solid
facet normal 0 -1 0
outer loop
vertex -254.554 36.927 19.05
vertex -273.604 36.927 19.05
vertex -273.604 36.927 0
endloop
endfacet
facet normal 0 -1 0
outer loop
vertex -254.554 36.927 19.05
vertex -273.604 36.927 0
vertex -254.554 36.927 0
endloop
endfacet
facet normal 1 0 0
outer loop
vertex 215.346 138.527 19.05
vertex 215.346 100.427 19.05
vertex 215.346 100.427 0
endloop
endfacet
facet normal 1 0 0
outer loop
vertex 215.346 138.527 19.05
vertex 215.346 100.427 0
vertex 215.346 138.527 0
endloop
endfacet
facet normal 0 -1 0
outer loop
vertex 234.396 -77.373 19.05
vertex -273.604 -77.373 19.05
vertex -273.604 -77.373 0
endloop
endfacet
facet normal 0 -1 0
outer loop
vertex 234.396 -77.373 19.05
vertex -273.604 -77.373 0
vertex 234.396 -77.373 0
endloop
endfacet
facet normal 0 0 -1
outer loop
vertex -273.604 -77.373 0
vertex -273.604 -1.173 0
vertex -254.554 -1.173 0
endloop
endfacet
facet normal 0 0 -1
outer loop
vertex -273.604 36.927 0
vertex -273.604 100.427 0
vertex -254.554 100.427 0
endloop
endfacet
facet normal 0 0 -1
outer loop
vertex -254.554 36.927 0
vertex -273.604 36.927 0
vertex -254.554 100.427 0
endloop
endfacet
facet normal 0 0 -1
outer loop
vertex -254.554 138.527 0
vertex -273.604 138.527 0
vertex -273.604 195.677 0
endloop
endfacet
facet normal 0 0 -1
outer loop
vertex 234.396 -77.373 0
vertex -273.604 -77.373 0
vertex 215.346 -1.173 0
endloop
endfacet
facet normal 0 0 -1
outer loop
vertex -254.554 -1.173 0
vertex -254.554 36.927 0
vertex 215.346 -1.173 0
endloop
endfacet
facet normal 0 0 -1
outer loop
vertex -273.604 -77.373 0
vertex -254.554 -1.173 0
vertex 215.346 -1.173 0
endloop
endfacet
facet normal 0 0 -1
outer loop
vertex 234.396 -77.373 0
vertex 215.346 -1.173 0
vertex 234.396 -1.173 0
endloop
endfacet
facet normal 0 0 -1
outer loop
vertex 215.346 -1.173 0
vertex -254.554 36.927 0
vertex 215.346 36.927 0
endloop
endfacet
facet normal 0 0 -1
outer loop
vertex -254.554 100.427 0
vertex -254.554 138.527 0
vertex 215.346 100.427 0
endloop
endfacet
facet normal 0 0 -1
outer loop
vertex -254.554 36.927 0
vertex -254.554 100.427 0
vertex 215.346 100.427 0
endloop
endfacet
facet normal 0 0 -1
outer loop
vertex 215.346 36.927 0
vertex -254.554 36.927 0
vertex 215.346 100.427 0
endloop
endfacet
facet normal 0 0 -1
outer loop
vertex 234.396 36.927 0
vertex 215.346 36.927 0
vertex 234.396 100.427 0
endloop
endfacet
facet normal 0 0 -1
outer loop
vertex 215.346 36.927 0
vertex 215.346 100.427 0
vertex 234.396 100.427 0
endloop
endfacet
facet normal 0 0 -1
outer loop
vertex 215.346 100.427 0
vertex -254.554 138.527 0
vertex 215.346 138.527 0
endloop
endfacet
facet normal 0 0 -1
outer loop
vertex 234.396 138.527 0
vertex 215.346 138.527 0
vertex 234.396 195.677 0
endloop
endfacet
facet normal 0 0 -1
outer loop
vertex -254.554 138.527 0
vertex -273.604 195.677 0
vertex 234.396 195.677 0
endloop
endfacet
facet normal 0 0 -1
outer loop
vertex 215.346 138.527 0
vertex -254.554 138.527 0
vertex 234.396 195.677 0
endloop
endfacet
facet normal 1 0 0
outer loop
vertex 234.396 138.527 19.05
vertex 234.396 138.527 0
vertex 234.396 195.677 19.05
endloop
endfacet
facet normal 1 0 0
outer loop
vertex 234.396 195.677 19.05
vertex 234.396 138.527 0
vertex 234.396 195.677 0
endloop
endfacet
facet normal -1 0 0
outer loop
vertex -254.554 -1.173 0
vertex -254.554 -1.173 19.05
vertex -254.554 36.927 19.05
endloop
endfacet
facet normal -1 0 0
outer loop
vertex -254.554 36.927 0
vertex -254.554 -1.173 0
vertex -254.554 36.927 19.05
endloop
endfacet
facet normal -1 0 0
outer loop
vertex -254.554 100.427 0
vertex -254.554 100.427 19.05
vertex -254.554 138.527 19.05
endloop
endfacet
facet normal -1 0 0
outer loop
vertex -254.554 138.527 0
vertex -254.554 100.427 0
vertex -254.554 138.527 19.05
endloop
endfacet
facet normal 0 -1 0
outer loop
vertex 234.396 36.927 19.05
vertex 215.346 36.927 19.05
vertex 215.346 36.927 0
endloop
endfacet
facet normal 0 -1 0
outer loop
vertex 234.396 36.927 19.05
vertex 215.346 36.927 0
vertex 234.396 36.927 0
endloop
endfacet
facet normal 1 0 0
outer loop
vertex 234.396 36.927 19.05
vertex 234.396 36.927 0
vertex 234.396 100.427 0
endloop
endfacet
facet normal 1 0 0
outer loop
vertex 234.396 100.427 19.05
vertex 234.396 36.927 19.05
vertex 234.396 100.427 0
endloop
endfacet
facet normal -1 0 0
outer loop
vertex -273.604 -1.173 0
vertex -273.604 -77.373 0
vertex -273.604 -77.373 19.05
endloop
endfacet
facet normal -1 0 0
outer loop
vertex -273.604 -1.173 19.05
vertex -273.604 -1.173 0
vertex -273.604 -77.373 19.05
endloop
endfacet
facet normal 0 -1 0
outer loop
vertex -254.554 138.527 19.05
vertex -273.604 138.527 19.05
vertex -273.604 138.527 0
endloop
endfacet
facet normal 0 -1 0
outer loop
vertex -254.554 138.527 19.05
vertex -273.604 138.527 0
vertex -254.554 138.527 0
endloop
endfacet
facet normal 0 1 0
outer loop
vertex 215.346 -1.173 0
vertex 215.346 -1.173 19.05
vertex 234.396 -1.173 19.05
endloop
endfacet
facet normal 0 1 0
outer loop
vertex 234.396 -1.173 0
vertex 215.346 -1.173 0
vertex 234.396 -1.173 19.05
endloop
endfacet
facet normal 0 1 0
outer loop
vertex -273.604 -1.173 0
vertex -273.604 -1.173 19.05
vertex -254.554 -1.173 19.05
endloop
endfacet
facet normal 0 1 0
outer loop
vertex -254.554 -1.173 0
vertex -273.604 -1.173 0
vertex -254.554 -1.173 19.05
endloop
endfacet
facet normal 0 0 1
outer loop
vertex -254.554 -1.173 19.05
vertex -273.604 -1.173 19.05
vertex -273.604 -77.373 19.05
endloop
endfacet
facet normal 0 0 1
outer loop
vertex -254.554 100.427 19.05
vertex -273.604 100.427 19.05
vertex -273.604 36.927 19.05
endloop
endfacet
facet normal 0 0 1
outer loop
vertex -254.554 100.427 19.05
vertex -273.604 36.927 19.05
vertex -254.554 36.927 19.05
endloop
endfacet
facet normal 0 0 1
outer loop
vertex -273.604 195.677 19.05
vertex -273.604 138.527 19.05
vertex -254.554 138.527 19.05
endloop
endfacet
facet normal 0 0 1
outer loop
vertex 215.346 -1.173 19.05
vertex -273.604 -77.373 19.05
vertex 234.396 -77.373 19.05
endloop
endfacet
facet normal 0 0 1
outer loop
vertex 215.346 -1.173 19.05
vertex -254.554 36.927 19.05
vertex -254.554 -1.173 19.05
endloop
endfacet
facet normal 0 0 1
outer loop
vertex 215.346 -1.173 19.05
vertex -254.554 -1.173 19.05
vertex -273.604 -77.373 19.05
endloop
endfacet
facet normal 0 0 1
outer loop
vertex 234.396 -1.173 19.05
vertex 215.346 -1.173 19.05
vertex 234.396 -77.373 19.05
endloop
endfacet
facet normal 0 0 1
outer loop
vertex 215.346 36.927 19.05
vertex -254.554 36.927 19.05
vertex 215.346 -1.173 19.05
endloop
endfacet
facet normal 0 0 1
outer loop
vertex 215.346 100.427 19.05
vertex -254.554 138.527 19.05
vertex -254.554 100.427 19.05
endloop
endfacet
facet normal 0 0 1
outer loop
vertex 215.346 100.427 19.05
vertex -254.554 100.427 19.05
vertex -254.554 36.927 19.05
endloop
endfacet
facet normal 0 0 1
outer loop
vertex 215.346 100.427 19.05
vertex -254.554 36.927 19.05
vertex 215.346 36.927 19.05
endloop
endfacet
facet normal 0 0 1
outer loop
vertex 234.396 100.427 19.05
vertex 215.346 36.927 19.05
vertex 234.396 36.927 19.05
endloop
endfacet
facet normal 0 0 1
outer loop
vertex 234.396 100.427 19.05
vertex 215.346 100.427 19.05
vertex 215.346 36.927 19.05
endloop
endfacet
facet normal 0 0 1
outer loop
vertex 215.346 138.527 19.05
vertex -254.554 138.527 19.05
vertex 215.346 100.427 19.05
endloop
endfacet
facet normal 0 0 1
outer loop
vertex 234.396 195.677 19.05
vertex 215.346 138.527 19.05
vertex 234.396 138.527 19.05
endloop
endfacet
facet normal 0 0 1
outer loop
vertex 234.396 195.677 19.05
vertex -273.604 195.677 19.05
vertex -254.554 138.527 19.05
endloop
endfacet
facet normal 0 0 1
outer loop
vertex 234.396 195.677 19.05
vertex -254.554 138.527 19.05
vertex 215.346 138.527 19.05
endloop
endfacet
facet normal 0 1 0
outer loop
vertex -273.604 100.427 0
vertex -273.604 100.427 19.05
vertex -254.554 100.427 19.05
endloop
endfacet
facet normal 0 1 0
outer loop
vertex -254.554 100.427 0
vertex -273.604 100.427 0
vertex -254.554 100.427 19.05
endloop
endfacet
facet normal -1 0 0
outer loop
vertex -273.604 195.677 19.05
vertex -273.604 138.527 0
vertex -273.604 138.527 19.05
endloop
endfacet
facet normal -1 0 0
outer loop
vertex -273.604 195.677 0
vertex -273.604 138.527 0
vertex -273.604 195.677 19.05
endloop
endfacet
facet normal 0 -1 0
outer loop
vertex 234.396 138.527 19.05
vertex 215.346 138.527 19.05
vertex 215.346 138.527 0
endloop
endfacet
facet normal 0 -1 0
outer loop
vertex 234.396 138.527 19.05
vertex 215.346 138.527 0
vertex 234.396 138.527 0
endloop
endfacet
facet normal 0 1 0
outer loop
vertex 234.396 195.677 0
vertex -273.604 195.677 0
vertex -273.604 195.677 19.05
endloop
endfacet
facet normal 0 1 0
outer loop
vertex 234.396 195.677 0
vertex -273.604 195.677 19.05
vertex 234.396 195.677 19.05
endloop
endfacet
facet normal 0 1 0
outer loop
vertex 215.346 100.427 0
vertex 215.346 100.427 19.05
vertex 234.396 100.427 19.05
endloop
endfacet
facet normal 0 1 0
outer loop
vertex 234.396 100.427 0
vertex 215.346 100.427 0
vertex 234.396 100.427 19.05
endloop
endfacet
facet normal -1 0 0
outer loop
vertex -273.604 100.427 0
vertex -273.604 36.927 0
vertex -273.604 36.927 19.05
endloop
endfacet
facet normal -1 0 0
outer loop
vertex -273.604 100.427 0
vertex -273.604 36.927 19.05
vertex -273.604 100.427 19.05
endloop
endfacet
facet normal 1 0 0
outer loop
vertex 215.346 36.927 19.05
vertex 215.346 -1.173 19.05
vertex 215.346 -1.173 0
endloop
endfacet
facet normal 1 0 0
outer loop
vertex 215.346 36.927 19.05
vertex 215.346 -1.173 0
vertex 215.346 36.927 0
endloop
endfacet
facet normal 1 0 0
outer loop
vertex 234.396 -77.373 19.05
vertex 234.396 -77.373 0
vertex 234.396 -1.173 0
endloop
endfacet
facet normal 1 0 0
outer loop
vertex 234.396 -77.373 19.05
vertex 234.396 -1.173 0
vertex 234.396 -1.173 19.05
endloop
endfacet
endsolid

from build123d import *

# Parameters (mm, degrees)
F0_W     = 508
F0_H     = 254
F1_DEPTH = 19.05
F2_W     = 19.05
F2_H     = 38.1
F3_DEPTH = 19.05
F4_W     = 508
F4_H     = 19.05
F5_DEPTH = 19.05


with BuildPart() as f1:
    # F0 (on Top) → F1 (new body)
    with BuildSketch(Plane.XY):
        with Locations((-19.604288, 68.676595)):
            Rectangle(F0_W, F0_H)
    extrude(amount=F1_DEPTH)

    # F2 (on face) → F3 (cut)
    with BuildSketch(Plane.XY.offset(19.05)):
        with Locations((-264.079288, 119.476595)):
            Rectangle(F2_W, F2_H)
        with Locations((-264.079288, 17.876595)):
            Rectangle(F2_W, F2_H)
        with Locations((224.870712, 119.476595)):
            Rectangle(F2_W, F2_H)
        with Locations((224.870712, 17.876595)):
            Rectangle(F2_W, F2_H)
    extrude(amount=-F3_DEPTH, mode=Mode.SUBTRACT)

    # F4 (on face) → F5 (join)
    with BuildSketch(Plane.XZ.offset(58.323405)):
        with Locations((-19.604288, 9.525)):
            Rectangle(F4_W, F4_H)
    extrude(amount=F5_DEPTH)


solid = f1.part
